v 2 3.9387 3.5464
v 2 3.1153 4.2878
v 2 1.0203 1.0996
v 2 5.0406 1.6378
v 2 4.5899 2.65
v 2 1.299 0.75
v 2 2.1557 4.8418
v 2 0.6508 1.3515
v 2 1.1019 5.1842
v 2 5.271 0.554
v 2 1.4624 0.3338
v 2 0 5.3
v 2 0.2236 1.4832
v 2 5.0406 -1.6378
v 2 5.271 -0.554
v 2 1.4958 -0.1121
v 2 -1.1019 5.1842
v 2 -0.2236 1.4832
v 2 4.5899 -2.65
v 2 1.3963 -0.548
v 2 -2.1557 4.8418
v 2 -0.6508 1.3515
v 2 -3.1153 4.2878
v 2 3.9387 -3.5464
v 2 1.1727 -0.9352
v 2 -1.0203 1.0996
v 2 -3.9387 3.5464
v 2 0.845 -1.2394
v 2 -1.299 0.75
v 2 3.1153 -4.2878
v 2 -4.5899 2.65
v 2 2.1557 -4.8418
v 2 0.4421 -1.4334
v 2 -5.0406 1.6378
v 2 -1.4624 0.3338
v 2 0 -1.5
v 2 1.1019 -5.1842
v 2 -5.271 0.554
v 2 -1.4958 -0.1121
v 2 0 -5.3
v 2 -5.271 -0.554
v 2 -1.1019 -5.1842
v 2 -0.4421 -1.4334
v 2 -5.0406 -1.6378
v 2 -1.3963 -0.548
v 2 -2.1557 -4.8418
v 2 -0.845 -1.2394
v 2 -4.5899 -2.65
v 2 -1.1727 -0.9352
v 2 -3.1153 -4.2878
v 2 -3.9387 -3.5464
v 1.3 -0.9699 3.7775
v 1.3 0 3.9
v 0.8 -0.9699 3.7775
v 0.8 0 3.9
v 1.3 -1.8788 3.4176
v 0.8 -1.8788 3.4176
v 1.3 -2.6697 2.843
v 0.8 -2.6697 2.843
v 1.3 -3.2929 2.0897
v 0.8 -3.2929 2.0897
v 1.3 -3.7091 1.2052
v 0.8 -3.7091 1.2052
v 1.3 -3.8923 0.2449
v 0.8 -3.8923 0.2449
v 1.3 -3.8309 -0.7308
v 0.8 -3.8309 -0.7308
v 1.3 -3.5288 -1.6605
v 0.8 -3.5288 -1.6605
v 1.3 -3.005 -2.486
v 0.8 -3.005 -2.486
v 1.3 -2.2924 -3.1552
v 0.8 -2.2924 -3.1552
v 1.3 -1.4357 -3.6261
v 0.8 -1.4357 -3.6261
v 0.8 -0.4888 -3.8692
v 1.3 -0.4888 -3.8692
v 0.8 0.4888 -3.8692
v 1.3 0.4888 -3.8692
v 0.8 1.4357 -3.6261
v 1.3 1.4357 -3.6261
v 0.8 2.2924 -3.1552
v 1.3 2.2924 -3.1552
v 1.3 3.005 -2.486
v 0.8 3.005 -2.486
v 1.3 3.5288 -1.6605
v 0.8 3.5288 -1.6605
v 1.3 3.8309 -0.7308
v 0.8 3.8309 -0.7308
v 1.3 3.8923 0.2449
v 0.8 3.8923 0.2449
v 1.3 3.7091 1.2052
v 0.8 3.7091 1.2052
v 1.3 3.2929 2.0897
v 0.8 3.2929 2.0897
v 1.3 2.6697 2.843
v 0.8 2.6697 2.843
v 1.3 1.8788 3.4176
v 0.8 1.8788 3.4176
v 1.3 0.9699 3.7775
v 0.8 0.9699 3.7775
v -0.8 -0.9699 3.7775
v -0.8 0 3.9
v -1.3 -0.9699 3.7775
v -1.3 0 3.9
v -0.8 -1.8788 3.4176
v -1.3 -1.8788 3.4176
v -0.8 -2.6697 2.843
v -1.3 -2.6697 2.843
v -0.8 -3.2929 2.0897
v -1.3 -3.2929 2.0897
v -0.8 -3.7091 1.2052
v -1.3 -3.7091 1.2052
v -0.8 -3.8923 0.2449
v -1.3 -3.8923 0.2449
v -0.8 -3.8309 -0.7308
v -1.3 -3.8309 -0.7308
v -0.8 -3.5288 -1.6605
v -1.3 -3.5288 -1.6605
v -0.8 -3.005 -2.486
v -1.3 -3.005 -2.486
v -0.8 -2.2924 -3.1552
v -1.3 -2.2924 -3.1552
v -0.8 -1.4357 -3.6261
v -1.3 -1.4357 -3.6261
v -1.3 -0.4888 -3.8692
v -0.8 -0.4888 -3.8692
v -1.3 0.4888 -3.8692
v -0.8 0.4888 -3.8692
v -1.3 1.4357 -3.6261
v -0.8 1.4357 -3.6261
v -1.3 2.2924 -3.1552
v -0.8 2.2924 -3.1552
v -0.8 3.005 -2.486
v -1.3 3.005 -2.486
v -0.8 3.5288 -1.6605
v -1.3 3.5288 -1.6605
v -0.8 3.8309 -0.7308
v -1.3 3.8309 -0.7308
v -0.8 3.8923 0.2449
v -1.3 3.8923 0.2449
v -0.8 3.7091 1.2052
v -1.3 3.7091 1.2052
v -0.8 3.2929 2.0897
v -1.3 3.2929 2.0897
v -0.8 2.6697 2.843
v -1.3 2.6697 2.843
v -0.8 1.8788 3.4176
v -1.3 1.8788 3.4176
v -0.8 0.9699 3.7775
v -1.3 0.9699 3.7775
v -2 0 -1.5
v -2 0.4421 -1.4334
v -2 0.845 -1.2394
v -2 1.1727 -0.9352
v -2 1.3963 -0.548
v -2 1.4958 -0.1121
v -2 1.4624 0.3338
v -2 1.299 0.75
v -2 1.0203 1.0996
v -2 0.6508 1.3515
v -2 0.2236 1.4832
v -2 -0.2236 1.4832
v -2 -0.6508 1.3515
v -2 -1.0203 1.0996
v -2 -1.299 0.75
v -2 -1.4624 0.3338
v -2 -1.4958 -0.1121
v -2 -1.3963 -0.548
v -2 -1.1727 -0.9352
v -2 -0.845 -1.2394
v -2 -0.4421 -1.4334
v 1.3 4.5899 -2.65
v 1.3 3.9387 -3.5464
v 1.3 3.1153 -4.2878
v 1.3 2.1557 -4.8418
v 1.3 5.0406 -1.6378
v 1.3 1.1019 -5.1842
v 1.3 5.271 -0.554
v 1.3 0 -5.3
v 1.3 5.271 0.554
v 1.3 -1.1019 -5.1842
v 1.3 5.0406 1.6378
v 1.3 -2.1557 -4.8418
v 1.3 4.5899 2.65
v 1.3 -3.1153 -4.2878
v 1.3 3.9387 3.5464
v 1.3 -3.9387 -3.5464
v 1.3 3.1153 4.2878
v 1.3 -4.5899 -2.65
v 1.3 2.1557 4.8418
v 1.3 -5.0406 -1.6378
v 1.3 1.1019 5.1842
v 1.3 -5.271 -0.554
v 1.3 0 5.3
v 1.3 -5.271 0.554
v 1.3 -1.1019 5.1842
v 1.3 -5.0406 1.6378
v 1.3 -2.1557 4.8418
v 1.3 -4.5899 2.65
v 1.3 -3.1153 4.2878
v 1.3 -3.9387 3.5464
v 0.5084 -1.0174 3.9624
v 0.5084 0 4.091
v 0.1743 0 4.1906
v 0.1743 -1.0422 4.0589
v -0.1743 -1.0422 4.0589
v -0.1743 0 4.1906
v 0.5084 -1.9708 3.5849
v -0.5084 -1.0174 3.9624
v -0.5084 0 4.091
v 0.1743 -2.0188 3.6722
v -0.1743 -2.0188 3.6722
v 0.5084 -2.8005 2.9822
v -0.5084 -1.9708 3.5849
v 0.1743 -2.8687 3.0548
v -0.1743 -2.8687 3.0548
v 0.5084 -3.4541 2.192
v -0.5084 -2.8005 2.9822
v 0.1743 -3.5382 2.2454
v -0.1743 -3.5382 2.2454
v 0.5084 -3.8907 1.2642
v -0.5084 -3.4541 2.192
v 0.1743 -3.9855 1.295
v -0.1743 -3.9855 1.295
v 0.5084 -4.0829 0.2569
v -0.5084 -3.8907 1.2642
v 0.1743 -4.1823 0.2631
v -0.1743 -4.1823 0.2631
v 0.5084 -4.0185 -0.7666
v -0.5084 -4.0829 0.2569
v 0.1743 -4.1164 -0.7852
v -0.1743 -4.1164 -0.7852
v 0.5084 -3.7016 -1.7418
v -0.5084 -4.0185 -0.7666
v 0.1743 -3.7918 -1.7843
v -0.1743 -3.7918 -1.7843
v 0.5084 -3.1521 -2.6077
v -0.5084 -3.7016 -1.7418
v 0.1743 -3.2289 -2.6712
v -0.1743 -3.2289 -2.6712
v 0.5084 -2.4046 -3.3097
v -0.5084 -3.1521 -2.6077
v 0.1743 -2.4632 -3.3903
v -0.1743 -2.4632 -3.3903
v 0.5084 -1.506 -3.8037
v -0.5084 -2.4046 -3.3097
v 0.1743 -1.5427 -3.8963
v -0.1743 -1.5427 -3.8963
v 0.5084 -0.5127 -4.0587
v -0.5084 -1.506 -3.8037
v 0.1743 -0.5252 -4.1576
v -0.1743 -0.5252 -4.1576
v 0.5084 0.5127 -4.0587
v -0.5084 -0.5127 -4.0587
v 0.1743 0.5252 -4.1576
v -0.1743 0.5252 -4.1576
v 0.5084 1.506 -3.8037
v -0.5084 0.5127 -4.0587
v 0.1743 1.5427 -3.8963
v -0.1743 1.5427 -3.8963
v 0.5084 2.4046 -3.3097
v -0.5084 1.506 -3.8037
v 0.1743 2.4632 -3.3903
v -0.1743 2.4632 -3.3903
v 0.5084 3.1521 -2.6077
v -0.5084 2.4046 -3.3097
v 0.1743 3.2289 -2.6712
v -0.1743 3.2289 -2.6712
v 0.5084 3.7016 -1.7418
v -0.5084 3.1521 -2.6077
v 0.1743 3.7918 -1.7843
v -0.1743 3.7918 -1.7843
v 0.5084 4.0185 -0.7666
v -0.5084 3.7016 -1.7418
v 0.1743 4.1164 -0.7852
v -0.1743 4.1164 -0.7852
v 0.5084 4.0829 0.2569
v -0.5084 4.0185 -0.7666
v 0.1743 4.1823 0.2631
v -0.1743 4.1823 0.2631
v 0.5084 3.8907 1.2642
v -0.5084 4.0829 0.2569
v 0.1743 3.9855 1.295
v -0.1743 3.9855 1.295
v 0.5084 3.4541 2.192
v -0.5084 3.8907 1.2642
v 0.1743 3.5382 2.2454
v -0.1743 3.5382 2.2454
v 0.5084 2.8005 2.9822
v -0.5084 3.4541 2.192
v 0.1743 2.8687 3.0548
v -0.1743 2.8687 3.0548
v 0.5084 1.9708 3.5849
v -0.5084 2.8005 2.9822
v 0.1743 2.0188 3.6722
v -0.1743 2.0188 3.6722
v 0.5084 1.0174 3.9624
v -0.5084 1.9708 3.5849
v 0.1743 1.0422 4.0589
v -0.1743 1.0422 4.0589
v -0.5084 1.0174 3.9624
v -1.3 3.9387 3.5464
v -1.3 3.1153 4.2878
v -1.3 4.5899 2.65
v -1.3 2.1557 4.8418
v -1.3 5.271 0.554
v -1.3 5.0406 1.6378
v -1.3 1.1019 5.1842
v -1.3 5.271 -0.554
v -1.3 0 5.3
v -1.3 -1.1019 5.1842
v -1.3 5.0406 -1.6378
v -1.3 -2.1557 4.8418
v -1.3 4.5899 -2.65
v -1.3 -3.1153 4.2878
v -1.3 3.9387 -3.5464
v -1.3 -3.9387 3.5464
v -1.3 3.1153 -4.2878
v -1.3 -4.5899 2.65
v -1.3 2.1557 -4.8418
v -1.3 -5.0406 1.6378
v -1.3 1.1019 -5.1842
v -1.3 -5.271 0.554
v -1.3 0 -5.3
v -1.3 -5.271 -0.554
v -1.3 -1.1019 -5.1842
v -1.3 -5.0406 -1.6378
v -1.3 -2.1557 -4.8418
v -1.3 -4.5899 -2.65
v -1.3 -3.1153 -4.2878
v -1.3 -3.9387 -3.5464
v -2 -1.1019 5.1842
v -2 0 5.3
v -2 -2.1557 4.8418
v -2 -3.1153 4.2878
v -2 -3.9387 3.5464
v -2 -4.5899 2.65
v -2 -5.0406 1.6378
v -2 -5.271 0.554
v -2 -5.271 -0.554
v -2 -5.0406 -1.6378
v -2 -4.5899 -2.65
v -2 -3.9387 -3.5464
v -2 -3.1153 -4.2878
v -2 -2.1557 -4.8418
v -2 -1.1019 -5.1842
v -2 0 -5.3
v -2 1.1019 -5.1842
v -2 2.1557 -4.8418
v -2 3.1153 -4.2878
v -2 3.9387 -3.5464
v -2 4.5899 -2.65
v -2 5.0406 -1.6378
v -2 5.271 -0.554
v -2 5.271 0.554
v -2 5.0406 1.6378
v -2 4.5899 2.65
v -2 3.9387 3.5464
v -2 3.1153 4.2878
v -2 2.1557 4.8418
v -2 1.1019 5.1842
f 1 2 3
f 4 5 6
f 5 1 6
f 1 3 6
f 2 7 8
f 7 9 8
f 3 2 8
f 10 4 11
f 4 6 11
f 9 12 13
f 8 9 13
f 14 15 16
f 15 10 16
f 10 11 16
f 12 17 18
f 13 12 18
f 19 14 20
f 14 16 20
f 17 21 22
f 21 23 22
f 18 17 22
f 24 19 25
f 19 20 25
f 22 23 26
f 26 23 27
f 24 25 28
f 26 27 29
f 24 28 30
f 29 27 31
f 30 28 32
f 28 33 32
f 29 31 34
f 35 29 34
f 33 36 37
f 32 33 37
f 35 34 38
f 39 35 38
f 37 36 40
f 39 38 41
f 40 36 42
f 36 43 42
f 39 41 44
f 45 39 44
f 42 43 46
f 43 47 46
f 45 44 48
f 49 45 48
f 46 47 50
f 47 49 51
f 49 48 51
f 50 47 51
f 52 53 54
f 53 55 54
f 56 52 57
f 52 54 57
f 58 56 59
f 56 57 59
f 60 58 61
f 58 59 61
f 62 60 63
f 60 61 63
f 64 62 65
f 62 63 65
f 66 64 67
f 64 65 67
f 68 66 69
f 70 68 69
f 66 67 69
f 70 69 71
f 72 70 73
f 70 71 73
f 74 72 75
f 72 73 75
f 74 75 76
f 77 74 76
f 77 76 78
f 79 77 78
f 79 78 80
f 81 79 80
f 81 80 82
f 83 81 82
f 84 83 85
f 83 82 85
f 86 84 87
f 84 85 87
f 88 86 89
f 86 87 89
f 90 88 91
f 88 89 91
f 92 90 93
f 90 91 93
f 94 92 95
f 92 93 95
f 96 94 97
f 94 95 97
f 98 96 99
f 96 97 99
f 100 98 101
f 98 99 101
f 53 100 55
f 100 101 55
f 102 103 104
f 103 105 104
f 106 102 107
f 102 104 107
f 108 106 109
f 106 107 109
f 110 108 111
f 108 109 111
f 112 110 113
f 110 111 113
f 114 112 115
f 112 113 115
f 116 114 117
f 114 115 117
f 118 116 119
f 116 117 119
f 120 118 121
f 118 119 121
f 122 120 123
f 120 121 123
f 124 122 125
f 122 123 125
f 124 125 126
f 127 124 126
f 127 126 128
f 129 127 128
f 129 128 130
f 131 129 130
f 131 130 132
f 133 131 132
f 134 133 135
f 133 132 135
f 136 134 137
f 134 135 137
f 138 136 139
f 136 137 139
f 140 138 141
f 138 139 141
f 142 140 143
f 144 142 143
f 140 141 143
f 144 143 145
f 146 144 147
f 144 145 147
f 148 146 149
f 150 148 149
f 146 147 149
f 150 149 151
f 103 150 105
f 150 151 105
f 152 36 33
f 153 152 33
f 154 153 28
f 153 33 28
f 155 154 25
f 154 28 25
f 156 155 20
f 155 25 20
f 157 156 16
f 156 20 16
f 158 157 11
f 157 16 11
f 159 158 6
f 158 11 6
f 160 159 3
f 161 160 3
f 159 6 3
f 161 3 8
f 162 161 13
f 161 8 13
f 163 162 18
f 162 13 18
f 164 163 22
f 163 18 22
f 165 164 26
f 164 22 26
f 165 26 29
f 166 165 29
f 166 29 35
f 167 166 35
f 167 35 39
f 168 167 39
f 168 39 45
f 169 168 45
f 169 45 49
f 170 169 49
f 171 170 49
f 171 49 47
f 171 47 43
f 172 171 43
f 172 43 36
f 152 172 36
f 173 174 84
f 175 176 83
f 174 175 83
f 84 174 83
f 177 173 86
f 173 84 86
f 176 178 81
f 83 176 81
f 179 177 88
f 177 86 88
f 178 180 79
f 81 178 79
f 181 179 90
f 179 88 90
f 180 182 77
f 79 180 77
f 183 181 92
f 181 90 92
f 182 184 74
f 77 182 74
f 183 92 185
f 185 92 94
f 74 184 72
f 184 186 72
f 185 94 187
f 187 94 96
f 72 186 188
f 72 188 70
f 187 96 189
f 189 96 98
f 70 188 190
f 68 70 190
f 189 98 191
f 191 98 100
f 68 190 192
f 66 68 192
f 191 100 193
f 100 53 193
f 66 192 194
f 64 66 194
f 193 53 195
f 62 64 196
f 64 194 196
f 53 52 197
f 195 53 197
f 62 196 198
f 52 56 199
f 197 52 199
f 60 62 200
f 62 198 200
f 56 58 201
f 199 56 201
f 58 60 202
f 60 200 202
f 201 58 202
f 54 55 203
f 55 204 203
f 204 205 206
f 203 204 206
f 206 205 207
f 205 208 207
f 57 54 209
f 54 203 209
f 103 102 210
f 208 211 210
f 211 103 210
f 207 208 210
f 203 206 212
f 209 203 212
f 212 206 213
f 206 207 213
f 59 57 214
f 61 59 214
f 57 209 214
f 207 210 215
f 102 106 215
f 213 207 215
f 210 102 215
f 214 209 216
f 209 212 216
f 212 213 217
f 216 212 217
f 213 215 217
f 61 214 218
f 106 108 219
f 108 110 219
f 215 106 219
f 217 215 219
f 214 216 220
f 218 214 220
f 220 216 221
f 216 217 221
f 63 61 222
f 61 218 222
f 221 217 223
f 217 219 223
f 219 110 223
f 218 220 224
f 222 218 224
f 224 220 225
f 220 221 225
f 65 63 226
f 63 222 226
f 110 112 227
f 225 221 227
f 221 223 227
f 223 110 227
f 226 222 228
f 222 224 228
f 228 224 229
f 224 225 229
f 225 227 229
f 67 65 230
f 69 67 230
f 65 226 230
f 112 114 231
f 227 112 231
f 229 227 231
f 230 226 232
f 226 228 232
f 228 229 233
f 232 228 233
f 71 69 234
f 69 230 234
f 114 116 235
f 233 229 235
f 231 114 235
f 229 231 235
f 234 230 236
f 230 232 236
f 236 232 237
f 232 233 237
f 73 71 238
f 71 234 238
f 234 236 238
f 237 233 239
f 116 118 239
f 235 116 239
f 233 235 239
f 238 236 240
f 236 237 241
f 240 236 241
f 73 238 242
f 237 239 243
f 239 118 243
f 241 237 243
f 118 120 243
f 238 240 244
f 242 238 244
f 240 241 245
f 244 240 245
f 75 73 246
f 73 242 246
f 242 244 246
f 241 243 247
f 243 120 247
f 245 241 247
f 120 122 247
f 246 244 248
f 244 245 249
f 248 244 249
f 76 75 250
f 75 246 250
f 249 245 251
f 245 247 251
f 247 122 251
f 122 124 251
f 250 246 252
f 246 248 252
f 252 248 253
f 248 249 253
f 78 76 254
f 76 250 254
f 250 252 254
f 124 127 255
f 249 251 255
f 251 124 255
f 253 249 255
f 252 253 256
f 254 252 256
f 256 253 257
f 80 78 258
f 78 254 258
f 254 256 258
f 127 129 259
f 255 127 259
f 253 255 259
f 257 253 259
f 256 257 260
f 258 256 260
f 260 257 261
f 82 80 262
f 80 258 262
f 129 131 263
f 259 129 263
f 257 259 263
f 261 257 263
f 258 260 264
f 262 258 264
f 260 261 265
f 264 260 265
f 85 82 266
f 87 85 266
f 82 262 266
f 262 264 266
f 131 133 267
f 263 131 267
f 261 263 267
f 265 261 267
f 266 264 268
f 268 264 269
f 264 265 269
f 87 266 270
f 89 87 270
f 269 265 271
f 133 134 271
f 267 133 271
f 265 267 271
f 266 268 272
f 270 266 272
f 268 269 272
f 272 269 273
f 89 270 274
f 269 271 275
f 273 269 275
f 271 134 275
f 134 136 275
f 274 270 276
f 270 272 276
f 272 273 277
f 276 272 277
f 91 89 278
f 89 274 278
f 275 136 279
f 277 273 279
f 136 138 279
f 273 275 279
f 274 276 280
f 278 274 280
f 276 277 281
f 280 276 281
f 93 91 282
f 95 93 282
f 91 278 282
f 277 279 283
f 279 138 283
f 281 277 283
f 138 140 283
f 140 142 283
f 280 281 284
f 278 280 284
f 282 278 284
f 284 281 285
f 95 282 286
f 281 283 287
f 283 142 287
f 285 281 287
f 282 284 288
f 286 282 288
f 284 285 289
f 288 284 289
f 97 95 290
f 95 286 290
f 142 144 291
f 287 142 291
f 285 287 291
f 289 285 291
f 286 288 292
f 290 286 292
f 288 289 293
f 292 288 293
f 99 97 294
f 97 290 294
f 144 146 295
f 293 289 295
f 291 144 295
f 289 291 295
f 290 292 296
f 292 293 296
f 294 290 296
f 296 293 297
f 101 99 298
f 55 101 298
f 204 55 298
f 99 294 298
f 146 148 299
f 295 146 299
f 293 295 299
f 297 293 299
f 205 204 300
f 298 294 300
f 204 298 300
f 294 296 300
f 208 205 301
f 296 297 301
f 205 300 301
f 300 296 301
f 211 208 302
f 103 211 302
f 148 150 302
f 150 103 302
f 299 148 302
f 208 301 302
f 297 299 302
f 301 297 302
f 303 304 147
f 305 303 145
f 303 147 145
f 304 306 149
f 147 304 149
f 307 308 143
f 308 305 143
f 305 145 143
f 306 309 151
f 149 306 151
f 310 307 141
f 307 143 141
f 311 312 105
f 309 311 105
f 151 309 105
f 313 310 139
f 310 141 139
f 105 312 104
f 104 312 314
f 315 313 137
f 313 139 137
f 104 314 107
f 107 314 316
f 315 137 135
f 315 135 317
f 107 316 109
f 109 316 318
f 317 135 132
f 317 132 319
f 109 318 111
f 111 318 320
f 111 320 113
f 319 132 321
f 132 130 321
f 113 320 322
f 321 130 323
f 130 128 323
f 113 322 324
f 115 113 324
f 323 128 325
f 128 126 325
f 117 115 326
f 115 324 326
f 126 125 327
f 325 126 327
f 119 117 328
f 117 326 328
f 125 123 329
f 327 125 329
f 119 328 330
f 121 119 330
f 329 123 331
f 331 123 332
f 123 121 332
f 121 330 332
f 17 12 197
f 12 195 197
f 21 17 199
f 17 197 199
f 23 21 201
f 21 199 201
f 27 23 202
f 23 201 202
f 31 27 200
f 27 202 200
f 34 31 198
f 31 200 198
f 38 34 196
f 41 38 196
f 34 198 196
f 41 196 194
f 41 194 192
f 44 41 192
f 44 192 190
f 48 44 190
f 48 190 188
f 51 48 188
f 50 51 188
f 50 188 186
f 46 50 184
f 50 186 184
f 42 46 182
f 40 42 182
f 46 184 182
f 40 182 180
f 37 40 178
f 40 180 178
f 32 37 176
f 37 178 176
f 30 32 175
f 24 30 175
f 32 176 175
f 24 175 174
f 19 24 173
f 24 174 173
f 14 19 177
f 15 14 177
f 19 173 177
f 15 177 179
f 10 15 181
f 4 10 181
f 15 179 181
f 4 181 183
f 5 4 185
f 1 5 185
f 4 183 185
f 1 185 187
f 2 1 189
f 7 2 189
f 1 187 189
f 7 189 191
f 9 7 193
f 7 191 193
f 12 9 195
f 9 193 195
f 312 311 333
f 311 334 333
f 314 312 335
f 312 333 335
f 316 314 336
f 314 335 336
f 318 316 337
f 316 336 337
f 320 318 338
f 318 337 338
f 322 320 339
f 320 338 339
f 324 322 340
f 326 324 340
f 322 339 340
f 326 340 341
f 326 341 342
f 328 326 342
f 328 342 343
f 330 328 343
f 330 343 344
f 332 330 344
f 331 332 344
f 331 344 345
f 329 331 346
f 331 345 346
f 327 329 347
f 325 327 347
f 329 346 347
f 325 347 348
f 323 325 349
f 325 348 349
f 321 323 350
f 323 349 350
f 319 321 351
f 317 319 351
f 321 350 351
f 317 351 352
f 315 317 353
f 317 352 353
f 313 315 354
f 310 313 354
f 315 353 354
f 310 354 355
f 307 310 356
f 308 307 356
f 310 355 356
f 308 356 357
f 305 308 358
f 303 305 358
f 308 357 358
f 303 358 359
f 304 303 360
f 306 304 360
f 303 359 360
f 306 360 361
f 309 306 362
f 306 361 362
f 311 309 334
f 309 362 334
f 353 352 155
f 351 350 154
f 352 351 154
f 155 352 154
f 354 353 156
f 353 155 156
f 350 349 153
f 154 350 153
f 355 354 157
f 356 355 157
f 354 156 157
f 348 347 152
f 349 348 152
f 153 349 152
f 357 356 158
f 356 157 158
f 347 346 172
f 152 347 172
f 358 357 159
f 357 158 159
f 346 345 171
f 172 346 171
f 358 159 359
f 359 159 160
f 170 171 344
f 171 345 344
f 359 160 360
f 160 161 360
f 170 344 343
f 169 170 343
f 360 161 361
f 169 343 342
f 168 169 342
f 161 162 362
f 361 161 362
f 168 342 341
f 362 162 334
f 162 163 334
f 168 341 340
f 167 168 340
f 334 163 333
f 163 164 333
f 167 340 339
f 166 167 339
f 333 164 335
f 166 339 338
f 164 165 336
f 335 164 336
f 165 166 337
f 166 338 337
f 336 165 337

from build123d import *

# Parameters (mm, degrees)
SKETCH2_R          = 1.5
CUT_EXTRUDE1_DEPTH = 9.495881355


with BuildPart() as part:
    # Sketch1 → Revolve1 (revolve)
    with BuildSketch(Plane.XY, mode=Mode.PRIVATE) as revolve1_sk:
        with BuildLine():
            Line((0, 0), (2, 0))
            Line((2, 0), (2, 5.3))
            Line((2, 5.3), (1.3, 5.3))
            Line((1.3, 5.3), (1.3, 3.9))
            Line((1.3, 3.9), (0.8, 3.9))
            ThreePointArc((0.8, 3.9), (0, 4.203250351), (-0.8, 3.9))
            Line((-0.8, 3.9), (-1.3, 3.9))
            Line((-1.3, 3.9), (-1.3, 5.3))
            Line((-1.3, 5.3), (-2, 5.3))
            Line((-2, 5.3), (-2, 0))
            Line((-2, 0), (0, 0))
        make_face()
    revolve(revolve1_sk.sketch.rotate(Axis((0, 0, 0), (1, 0, 0)), 90), axis=Axis((0, 0, 0), (1, 0, 0)))

    # Sketch2 → Cut-Extrude1 (cut, through all)
    with BuildSketch(Plane(origin=(2, 0, 0), x_dir=(0, 0, -1), z_dir=(1, 0, 0))):
        Circle(SKETCH2_R)
    extrude(amount=-CUT_EXTRUDE1_DEPTH, mode=Mode.SUBTRACT)


solid = part.part
